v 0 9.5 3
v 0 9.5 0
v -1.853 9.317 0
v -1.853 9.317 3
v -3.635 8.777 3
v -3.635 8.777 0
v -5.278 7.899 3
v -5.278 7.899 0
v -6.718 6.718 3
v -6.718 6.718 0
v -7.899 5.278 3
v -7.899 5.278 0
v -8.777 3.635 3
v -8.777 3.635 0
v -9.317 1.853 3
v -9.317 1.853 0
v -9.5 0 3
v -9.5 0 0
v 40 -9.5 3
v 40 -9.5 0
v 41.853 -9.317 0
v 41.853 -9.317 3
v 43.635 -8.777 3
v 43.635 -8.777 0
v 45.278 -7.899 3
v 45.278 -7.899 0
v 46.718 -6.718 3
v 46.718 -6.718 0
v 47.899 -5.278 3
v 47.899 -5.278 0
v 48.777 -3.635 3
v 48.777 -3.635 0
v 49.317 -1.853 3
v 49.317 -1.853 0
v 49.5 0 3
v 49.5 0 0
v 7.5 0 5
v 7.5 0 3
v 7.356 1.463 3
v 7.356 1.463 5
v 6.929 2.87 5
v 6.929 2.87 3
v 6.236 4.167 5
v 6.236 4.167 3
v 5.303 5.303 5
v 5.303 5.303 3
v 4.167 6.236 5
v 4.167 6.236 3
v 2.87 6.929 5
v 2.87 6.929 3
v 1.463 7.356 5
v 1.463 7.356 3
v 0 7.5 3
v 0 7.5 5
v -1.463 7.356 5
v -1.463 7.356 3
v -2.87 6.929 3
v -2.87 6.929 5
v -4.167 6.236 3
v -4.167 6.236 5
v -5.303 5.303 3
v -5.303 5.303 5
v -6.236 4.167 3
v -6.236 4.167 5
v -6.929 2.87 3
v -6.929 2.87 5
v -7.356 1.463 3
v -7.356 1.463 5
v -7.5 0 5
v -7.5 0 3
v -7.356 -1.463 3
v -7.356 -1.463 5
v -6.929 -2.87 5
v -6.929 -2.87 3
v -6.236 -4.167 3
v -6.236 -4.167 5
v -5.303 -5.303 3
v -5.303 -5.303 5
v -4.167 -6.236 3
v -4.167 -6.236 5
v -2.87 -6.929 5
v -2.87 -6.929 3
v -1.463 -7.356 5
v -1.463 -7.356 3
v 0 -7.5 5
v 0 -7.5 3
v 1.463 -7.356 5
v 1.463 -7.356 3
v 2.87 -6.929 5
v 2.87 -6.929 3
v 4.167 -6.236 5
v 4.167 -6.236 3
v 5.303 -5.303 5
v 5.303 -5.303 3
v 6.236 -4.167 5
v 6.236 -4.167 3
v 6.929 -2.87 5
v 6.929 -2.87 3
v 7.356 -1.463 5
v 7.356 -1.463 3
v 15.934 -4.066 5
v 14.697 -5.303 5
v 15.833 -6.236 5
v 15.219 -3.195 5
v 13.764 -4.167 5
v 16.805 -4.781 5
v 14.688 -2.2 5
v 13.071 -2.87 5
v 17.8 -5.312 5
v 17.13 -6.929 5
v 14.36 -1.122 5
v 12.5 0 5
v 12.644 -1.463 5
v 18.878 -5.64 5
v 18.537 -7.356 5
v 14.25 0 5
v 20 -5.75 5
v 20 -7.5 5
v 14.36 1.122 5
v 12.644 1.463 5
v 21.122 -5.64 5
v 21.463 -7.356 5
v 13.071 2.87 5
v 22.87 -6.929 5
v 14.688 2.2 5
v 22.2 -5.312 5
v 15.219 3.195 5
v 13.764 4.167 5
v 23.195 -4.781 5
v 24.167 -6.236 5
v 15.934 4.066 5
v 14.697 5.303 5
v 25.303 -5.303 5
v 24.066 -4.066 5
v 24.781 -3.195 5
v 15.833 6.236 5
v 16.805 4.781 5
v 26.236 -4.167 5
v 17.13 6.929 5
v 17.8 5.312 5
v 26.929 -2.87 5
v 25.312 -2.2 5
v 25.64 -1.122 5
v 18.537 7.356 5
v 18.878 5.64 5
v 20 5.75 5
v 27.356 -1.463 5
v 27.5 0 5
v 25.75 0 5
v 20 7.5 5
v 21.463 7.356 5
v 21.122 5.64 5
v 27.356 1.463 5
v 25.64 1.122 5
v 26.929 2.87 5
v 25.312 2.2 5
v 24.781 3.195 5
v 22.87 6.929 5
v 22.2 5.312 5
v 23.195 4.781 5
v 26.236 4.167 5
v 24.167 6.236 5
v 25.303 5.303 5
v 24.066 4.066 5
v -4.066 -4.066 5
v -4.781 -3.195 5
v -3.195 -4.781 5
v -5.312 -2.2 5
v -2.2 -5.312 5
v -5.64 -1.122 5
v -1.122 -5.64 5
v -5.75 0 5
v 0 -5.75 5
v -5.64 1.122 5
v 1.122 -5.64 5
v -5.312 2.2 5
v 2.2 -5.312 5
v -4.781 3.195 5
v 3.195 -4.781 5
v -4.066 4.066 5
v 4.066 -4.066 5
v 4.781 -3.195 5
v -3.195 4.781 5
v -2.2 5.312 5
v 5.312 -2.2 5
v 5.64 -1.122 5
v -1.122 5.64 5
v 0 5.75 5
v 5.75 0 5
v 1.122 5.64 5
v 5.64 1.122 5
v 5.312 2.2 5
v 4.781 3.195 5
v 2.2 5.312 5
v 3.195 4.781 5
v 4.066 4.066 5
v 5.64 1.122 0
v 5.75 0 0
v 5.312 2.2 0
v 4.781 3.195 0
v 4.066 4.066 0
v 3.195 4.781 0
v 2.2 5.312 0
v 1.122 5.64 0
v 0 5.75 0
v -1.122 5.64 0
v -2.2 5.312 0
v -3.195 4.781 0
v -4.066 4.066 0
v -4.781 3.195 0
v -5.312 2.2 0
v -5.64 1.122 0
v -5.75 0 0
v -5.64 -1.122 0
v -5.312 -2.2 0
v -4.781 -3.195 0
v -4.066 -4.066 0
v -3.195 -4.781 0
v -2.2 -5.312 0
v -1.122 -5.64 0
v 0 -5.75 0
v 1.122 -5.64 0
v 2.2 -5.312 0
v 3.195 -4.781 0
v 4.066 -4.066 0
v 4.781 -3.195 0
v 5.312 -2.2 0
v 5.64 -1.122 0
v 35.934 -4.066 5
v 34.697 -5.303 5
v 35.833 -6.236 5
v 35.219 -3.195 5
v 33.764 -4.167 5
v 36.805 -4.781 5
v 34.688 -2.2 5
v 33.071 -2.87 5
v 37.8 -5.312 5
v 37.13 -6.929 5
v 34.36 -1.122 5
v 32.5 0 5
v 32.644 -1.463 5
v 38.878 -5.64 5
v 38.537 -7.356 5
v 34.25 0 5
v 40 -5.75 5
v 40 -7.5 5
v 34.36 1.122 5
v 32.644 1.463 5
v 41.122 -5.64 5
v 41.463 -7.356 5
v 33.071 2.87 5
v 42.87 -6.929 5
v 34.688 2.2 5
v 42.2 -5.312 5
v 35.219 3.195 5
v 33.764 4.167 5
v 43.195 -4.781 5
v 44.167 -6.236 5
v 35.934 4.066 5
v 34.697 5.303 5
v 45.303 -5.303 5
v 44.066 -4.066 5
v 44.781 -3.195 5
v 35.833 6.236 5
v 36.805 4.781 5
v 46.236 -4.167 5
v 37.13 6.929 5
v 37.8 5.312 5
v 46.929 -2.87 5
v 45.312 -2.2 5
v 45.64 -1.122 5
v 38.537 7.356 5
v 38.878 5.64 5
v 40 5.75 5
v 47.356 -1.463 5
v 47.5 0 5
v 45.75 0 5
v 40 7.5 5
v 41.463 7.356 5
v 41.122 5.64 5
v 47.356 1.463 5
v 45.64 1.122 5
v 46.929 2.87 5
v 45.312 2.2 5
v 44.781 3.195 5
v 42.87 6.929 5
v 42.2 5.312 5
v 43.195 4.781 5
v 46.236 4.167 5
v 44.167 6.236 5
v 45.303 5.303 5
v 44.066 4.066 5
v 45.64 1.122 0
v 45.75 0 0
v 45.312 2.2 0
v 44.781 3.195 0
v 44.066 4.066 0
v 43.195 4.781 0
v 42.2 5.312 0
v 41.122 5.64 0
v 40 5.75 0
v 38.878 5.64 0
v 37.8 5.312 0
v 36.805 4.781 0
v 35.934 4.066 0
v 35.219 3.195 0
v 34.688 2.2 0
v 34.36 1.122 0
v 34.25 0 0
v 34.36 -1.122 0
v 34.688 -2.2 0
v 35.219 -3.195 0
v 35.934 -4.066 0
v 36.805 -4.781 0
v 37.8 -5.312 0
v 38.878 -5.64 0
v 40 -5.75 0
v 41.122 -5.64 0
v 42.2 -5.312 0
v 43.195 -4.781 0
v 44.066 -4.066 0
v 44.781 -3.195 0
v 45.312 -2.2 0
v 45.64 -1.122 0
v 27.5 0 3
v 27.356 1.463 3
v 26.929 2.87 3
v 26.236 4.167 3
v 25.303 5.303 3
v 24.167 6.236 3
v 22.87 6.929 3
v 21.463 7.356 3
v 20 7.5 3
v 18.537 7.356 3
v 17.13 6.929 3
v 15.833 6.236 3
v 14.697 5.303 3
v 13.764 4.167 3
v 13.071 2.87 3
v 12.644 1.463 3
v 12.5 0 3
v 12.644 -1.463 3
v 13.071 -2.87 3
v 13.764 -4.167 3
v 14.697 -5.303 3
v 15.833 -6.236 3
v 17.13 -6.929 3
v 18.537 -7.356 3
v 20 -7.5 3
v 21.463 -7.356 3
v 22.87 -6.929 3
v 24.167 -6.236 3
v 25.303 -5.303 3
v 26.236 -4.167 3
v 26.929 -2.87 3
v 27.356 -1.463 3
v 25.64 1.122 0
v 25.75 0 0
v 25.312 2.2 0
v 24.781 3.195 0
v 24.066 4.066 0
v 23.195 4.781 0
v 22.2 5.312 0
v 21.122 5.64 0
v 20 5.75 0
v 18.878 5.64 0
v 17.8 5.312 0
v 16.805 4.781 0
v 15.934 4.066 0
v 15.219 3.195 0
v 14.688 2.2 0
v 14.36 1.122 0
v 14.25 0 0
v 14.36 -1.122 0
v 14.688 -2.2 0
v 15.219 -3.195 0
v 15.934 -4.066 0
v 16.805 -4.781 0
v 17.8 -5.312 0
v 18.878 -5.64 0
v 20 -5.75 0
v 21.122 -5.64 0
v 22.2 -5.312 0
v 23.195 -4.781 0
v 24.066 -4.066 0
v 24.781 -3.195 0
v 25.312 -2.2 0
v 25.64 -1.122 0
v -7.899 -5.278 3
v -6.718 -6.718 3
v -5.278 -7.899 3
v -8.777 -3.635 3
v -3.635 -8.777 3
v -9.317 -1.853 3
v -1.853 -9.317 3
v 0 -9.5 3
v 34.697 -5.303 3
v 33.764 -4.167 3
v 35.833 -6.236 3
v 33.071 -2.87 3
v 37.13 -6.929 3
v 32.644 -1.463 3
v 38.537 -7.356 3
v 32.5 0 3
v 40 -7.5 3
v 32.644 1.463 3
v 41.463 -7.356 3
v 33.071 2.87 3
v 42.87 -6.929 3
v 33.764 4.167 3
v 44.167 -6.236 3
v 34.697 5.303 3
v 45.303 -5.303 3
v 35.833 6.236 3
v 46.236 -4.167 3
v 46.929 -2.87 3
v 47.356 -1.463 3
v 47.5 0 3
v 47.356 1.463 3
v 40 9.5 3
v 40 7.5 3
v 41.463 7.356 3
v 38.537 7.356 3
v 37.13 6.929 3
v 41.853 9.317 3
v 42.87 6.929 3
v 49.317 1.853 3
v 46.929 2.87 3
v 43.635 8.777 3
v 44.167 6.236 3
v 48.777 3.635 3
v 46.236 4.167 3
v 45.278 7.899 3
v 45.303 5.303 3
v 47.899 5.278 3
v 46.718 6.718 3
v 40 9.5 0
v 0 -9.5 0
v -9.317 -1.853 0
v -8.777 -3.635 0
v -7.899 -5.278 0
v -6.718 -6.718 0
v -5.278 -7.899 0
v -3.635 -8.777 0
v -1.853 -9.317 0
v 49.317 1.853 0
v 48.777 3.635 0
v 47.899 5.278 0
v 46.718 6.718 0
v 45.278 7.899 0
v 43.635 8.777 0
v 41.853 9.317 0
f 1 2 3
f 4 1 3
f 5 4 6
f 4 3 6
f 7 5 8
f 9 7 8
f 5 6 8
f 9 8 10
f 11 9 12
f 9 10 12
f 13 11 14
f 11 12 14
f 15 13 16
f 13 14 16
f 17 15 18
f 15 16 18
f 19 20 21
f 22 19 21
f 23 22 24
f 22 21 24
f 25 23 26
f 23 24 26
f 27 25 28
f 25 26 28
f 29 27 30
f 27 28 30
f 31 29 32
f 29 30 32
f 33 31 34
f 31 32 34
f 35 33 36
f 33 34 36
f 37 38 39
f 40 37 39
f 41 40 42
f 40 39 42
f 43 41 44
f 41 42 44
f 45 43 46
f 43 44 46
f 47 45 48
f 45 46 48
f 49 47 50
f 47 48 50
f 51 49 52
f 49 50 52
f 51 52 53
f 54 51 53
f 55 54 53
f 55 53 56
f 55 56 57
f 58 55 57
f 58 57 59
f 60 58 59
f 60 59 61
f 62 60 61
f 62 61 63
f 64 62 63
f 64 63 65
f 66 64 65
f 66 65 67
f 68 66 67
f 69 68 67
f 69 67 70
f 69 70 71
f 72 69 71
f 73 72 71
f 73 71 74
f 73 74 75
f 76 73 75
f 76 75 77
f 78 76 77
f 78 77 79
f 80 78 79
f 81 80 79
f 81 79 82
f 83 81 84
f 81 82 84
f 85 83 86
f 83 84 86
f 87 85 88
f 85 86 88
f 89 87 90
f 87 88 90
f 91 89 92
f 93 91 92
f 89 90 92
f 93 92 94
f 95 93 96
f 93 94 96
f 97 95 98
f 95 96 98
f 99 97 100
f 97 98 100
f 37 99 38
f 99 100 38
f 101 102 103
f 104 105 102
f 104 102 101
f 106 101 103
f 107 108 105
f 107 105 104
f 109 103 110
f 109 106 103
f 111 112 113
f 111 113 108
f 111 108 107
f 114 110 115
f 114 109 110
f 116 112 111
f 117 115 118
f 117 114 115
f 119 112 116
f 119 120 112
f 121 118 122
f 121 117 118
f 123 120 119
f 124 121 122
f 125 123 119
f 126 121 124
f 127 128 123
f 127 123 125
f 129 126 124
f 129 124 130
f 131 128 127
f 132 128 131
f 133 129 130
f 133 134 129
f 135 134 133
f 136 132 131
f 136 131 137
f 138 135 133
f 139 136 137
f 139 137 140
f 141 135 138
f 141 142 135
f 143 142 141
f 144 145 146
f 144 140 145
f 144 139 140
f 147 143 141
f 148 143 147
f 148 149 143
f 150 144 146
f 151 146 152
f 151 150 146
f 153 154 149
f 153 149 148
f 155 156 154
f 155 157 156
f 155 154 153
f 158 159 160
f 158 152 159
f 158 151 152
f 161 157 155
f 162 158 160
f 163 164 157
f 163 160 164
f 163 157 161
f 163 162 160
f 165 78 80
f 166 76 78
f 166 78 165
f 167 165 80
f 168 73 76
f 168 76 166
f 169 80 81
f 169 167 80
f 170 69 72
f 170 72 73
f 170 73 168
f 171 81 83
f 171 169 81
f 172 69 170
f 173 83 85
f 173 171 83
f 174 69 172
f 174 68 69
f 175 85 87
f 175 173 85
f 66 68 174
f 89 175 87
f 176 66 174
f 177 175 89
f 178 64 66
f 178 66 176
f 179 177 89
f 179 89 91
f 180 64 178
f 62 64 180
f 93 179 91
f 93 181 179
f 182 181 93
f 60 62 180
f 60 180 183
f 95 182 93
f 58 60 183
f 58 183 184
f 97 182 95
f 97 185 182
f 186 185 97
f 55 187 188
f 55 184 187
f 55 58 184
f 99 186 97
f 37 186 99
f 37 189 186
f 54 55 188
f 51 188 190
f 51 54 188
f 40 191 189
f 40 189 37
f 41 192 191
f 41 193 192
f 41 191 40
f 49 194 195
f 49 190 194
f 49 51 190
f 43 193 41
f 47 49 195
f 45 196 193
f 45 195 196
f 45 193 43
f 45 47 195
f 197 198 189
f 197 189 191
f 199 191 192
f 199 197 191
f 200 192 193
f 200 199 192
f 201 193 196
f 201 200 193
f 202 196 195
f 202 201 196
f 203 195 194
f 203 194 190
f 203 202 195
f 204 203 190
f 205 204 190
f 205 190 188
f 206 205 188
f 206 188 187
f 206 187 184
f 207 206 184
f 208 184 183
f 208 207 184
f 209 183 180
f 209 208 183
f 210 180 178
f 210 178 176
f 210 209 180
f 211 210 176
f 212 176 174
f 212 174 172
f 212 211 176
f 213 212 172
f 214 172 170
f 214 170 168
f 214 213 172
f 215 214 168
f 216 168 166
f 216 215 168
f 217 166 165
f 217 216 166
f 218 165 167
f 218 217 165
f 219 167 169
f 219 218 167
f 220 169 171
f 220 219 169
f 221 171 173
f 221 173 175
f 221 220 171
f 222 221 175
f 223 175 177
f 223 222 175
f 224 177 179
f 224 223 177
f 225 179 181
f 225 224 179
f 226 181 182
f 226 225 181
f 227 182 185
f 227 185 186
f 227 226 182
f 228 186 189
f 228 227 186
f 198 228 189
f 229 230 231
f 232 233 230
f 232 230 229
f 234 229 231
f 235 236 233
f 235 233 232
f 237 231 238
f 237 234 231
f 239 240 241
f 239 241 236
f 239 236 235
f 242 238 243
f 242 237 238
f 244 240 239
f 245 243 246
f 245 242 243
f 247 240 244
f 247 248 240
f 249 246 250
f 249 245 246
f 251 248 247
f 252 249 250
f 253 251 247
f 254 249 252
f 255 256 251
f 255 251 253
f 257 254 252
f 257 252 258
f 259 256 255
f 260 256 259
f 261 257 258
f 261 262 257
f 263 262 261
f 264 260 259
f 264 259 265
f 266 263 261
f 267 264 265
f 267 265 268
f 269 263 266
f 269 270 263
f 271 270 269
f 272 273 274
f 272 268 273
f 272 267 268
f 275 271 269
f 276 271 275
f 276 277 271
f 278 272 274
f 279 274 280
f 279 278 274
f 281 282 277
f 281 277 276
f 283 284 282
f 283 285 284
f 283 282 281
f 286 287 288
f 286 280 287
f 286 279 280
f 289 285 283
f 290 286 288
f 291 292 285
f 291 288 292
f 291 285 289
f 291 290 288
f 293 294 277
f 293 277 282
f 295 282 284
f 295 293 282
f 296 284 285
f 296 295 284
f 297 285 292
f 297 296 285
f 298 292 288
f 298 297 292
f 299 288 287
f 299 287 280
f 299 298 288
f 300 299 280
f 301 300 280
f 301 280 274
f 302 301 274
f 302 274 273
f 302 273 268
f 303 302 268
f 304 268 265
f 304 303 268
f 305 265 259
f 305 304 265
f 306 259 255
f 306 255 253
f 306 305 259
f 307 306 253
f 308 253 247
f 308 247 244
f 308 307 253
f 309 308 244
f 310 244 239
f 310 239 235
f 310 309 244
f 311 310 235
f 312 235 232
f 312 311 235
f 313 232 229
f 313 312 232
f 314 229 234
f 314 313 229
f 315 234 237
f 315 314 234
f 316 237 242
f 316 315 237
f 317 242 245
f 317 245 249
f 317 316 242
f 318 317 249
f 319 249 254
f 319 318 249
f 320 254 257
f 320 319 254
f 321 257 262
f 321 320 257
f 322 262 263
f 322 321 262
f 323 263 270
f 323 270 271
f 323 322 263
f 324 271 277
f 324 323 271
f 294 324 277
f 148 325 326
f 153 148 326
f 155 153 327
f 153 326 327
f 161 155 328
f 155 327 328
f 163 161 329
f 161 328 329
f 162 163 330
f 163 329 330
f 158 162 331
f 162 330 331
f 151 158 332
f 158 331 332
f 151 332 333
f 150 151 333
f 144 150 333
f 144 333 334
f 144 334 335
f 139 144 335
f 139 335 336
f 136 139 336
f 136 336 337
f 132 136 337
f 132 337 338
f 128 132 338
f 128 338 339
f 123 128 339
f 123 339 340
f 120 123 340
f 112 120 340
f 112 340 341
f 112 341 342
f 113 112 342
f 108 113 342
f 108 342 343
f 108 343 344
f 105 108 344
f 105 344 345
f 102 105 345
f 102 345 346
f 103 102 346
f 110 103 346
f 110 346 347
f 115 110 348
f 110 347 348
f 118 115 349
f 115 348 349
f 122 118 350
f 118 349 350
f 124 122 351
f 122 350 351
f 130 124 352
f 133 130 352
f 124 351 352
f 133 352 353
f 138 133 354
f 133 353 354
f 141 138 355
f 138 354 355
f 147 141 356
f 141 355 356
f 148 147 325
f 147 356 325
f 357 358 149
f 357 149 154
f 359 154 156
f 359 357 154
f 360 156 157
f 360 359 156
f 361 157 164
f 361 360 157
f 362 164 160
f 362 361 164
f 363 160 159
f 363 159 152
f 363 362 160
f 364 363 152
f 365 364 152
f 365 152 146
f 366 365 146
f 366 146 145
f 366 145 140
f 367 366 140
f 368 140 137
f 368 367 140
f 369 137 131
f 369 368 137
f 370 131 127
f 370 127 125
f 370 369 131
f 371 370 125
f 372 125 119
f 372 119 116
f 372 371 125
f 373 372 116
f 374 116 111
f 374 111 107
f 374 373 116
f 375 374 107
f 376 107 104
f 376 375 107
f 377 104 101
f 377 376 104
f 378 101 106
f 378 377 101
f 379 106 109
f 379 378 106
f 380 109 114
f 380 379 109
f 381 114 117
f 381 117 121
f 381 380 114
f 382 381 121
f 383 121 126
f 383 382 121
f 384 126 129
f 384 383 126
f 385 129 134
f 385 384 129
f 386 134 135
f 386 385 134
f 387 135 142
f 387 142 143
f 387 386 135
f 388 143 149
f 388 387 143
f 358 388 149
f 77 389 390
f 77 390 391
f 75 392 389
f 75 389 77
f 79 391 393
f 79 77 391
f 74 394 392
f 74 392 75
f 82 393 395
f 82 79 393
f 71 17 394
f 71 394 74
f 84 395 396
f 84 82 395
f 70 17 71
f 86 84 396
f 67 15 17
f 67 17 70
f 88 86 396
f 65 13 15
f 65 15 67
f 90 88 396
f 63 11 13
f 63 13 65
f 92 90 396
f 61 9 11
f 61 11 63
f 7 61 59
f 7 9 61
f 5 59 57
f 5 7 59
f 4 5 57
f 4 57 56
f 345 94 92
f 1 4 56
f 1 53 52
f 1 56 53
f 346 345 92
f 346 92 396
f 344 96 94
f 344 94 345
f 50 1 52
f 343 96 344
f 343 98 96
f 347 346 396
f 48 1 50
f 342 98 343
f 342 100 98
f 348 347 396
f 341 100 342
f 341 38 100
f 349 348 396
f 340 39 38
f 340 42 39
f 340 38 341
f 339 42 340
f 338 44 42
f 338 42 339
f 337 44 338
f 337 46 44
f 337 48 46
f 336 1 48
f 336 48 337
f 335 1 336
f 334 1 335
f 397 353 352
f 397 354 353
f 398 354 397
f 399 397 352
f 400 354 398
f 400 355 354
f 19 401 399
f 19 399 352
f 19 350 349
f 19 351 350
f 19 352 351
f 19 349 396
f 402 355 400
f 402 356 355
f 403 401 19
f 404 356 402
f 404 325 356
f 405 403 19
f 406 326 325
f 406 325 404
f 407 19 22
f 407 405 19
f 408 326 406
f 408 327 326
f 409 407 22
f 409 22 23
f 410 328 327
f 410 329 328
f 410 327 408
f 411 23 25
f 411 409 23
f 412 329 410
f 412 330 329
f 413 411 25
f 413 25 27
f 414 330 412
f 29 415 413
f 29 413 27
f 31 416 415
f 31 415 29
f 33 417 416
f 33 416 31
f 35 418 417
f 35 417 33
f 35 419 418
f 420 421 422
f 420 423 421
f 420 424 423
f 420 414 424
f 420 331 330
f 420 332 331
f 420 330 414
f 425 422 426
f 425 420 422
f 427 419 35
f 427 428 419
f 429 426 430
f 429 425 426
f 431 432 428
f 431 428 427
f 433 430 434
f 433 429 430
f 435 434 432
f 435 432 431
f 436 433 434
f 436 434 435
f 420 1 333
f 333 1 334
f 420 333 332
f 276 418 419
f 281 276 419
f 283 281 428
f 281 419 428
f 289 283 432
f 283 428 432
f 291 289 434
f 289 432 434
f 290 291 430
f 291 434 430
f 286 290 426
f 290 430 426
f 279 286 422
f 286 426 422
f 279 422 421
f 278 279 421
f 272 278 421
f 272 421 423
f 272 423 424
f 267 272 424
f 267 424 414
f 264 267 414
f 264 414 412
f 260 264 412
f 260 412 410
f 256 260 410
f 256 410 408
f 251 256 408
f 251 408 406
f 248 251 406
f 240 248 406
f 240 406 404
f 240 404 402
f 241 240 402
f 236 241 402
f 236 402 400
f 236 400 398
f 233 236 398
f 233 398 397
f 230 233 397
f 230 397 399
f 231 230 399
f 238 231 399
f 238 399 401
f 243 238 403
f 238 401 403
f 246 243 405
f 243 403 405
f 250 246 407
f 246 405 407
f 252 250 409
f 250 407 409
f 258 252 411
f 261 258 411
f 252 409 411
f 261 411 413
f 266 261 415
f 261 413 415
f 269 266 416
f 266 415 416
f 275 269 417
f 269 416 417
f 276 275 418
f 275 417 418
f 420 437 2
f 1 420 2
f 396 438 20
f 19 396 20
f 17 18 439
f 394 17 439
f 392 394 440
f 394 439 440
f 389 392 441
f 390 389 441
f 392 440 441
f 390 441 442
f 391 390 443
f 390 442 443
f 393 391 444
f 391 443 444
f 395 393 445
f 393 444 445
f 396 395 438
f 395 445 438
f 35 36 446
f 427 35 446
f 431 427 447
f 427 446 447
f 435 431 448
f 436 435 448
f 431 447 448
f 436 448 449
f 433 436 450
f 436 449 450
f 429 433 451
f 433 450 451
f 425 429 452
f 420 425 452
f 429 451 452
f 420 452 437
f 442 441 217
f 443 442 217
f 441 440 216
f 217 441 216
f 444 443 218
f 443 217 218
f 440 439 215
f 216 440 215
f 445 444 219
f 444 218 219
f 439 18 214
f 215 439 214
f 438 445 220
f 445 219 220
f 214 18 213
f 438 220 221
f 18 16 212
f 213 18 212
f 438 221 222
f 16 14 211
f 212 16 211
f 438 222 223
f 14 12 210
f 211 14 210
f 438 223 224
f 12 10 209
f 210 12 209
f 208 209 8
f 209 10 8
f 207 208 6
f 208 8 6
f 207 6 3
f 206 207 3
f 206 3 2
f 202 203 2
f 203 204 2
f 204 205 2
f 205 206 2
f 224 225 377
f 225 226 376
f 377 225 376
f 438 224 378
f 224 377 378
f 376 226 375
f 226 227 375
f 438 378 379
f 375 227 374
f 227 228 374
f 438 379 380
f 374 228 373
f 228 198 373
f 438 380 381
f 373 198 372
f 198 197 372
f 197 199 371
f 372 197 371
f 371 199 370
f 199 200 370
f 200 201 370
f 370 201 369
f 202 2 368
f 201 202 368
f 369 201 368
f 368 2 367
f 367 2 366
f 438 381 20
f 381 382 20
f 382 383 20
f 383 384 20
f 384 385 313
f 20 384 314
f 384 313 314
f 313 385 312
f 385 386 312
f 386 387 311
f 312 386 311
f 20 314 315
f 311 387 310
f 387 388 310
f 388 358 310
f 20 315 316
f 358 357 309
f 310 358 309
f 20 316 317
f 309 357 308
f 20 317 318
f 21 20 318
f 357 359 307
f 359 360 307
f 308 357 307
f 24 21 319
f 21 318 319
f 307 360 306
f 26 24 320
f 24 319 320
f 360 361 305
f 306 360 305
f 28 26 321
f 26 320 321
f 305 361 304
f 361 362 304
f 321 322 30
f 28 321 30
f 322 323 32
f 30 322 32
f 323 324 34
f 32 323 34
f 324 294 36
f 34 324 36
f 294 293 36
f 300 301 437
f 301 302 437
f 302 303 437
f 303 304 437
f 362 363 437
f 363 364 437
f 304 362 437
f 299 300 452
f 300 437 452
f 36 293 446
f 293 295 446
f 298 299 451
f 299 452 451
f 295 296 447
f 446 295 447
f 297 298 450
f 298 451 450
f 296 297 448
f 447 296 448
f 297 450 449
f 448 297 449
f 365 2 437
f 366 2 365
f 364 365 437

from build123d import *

# Parameters (mm, degrees)
F0_R     = 7.5
F1_DEPTH = 3
F0_R_2   = 5.75
F2_DEPTH = 5


# Not quite as in the source:
# - a feature names something its author has since deleted; it is built from what else it names


with BuildPart() as f1:
    # F0 (on Top) → F1 (new body)
    with BuildSketch(Plane.XY):
        with BuildLine():
            Line((40, 9.5), (0, 9.5))
            ThreePointArc((0, 9.5), (-6.7175144213, 6.7175144213), (-9.5, 0))
            ThreePointArc((-9.5, 0), (-6.7175144213, -6.7175144213), (0, -9.5))
            Line((0, -9.5), (40, -9.5))
            ThreePointArc((40, -9.5), (46.7175144213, -6.7175144213), (49.5, 0))
            ThreePointArc((49.5, 0), (46.7175144213, 6.7175144213), (40, 9.5))
        make_face()
        Circle(F0_R, mode=Mode.SUBTRACT)
        with Locations((20, 0)):
            Circle(F0_R, mode=Mode.SUBTRACT)
        with Locations((40, 0)):
            Circle(F0_R, mode=Mode.SUBTRACT)
    extrude(amount=F1_DEPTH)

    # F0 (on Top) → F2 (join)
    with BuildSketch(Plane.XY):
        Circle(F0_R)
        Circle(F0_R_2, mode=Mode.SUBTRACT)
        with Locations((20, 0)):
            Circle(F0_R)
        with Locations((20, 0)):
            Circle(F0_R_2, mode=Mode.SUBTRACT)
        with Locations((40, 0)):
            Circle(F0_R)
        with Locations((40, 0)):
            Circle(F0_R_2, mode=Mode.SUBTRACT)
    extrude(amount=F2_DEPTH)


solid = f1.part
